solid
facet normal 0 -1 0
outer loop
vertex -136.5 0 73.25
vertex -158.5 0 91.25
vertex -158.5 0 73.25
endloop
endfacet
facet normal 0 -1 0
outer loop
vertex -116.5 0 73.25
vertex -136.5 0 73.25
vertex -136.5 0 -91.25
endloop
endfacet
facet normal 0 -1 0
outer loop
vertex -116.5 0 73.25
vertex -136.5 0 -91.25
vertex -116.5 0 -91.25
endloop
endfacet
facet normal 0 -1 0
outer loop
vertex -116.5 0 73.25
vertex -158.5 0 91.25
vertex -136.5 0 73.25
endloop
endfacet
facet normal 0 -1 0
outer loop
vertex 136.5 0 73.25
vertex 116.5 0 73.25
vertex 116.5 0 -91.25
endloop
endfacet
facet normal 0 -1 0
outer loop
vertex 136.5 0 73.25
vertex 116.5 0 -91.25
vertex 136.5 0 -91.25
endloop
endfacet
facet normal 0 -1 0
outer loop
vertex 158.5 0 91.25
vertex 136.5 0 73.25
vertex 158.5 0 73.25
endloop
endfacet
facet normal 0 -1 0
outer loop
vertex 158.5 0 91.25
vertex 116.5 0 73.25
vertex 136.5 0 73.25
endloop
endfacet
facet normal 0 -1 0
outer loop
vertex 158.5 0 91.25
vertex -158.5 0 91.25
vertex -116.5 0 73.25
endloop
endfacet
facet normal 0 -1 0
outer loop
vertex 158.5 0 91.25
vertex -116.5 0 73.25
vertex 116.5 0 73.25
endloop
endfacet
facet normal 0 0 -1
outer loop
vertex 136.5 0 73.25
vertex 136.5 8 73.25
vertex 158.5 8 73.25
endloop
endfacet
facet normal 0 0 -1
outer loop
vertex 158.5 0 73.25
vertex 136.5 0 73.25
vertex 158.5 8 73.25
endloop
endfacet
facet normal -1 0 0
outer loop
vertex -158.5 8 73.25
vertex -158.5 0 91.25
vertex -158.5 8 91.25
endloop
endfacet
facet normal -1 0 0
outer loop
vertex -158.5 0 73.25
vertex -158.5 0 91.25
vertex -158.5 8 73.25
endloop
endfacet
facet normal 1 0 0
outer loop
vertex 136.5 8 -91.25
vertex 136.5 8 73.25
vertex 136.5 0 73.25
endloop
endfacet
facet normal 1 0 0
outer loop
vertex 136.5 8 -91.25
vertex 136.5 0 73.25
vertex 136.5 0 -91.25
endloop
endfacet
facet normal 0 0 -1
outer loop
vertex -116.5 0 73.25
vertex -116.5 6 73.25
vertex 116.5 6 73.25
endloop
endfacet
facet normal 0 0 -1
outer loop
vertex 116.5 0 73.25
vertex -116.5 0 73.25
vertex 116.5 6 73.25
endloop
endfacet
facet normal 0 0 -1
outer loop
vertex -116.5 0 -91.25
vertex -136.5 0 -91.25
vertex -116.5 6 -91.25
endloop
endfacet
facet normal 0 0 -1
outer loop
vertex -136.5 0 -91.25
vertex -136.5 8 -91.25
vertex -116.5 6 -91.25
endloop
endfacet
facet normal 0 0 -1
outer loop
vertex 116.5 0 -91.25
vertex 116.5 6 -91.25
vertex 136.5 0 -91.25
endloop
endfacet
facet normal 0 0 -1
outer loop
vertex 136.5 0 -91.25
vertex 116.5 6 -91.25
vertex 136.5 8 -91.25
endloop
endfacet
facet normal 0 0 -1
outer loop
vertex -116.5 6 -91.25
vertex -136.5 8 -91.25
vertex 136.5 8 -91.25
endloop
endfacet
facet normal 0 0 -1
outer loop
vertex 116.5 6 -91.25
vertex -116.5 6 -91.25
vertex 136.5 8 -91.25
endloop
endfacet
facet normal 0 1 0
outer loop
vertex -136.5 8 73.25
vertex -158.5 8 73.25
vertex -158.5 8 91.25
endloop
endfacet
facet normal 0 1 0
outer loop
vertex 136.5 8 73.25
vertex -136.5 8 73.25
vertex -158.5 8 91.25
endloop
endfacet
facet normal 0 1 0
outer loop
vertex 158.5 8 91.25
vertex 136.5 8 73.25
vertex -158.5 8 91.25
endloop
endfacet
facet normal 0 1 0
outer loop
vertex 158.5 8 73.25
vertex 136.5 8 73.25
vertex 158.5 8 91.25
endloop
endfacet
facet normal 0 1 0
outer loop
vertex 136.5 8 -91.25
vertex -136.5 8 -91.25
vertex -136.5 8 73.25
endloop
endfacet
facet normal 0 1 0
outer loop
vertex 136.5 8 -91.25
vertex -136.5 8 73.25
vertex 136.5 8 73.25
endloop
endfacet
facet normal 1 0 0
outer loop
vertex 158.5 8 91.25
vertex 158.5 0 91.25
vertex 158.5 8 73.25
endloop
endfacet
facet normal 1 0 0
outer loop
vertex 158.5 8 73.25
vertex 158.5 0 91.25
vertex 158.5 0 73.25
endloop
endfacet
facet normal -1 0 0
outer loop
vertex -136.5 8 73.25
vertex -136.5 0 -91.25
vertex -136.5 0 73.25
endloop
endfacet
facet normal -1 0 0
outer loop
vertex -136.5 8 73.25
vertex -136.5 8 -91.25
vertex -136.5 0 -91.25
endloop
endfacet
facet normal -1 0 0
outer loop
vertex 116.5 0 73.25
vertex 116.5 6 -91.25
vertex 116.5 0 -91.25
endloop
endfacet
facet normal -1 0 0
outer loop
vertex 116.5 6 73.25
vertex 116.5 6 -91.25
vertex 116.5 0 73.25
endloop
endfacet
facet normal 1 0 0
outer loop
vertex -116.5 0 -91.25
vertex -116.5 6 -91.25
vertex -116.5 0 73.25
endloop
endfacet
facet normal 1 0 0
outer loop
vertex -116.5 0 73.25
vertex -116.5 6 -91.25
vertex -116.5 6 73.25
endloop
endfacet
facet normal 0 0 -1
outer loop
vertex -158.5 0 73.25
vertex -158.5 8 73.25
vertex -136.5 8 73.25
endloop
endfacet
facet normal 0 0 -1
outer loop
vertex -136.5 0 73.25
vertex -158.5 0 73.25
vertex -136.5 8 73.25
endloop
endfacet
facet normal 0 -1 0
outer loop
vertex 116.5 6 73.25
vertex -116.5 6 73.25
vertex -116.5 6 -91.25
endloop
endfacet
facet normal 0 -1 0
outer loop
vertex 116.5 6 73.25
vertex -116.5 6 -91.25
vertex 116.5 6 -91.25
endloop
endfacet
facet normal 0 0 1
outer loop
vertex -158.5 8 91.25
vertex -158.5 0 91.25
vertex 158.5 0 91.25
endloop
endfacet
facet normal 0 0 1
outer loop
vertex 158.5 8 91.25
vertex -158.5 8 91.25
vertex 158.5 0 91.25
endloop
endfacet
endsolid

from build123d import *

# Parameters (mm, degrees)
SKETCH1_W           = 317
SKETCH1_H           = 182.5
BOSS_EXTRUDE1_DEPTH = 8
SKETCH3_W           = 22
SKETCH3_H           = 164.5
CUT_EXTRUDE3_DEPTH  = 184.065049914
SKETCH4_W           = 273
SKETCH4_H           = 164.5
CUT_EXTRUDE4_DEPTH  = 6
SKETCH5_W           = 20
SKETCH5_H           = 164.5
BOSS_EXTRUDE3_DEPTH = 6


with BuildPart() as part:
    # Sketch1 → Boss-Extrude1 (new body)
    with BuildSketch(Plane(origin=(0, 0, 0), x_dir=(1, 0, 0), z_dir=(0, 1, 0))):
        Rectangle(SKETCH1_W, SKETCH1_H)
    extrude(amount=BOSS_EXTRUDE1_DEPTH)

    # Sketch3 → Cut-Extrude3 (cut, through all)
    with BuildSketch(Plane(origin=(0, 8, 0), x_dir=(1, 0, 0), z_dir=(0, 1, 0))):
        with Locations((-147.5, 9)):
            Rectangle(SKETCH3_W, SKETCH3_H)
        with Locations((147.5, 9)):
            Rectangle(SKETCH3_W, SKETCH3_H)
    extrude(amount=-CUT_EXTRUDE3_DEPTH, mode=Mode.SUBTRACT)

    # Sketch4 → Cut-Extrude4 (cut)
    with BuildSketch(Plane.XZ):
        with Locations((0, -9)):
            Rectangle(SKETCH4_W, SKETCH4_H)
    extrude(amount=-CUT_EXTRUDE4_DEPTH, mode=Mode.SUBTRACT)

    # Sketch5 → Boss-Extrude3 (add)
    with BuildSketch(Plane.XZ.offset(-6)):
        with Locations((-126.5, -9)):
            Rectangle(SKETCH5_W, SKETCH5_H)
        with Locations((126.5, -9)):
            Rectangle(SKETCH5_W, SKETCH5_H)
    extrude(amount=BOSS_EXTRUDE3_DEPTH)


solid = part.part
